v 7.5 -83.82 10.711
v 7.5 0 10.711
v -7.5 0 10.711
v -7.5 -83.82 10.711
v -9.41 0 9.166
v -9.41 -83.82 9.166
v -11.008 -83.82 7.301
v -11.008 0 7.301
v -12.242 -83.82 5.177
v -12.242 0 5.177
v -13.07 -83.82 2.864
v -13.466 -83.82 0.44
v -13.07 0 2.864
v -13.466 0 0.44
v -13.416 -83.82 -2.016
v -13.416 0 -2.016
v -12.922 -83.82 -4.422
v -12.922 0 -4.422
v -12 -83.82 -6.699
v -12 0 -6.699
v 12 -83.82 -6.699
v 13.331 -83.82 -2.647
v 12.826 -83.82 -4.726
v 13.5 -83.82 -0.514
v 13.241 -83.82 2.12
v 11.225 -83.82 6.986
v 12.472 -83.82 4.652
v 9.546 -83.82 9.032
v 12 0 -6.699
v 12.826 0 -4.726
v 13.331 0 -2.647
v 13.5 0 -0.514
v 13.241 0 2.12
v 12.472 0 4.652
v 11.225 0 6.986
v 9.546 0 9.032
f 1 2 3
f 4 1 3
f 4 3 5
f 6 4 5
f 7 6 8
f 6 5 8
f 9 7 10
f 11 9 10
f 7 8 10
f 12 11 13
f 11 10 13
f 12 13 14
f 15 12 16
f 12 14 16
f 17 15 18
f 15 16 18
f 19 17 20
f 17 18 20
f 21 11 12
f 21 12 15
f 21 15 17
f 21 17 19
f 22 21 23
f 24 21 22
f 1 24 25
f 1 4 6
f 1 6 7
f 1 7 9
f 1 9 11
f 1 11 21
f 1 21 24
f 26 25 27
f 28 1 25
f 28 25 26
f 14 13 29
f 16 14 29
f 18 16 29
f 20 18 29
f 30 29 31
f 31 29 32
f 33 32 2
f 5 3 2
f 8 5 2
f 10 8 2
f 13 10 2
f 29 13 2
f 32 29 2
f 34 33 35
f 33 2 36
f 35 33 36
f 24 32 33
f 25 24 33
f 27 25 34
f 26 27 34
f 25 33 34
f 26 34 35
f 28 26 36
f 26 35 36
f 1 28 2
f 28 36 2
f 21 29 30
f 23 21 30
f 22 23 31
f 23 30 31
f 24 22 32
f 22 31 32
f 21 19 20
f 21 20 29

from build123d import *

# Parameters (mm, degrees)
F1_DEPTH = 83.82


with BuildPart() as f1:
    # F0 (on Front) → F1 (new body)
    with BuildSketch(Plane.XZ):
        with BuildLine():
            ThreePointArc((12, -6.698898), (13.119642, -3.696221), (13.5, -0.51424))
            ThreePointArc((13.5, -0.51424), (11.905881, 5.849721), (7.5, 10.710732))
            Line((7.5, 10.710732), (-7.5, 10.710732))
            ThreePointArc((-7.5, 10.710732), (-13.070436, 2.864175), (-12, -6.698898))
            Line((-12, -6.698898), (12, -6.698898))
        make_face()
    extrude(amount=F1_DEPTH)


solid = f1.part
